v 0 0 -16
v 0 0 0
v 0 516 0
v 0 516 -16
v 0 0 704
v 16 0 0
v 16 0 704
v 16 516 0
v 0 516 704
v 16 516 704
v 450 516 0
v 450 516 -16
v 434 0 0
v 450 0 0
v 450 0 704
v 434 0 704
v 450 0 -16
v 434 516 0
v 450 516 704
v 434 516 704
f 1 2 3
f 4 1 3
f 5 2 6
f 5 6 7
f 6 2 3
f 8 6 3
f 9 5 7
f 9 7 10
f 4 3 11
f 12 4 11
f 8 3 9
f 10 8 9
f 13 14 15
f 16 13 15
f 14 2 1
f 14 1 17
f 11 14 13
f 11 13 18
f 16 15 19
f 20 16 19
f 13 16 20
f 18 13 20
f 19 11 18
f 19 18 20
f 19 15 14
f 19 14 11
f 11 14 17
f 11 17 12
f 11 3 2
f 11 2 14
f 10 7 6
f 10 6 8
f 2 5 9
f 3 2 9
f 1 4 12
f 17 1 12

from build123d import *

# Parameters (mm, degrees)
F0_W     = 516
F0_H     = 704
F1_DEPTH = 16
F2_W     = 450
F2_H     = 516
F3_DEPTH = 16
F4_W     = 516
F4_H     = 704
F5_DEPTH = 16


with BuildPart() as f1:
    # F0 (on Right) → F1 (new body)
    with BuildSketch(Plane.YZ):
        with Locations((258, 352)):
            Rectangle(F0_W, F0_H)
    extrude(amount=F1_DEPTH)


with BuildPart() as f3:
    # F2 (on Top) → F3 (new body)
    with BuildSketch(Plane.XY):
        with Locations((225, 258)):
            Rectangle(F2_W, F2_H)
    extrude(amount=-F3_DEPTH)


with BuildPart() as f5:
    # F4 (on face) → F5 (new body)
    with BuildSketch(Plane.YZ.offset(450)):
        with Locations((258, 352)):
            Rectangle(F4_W, F4_H)
    extrude(amount=-F5_DEPTH)


solid = Compound([f1.part, f3.part, f5.part])
